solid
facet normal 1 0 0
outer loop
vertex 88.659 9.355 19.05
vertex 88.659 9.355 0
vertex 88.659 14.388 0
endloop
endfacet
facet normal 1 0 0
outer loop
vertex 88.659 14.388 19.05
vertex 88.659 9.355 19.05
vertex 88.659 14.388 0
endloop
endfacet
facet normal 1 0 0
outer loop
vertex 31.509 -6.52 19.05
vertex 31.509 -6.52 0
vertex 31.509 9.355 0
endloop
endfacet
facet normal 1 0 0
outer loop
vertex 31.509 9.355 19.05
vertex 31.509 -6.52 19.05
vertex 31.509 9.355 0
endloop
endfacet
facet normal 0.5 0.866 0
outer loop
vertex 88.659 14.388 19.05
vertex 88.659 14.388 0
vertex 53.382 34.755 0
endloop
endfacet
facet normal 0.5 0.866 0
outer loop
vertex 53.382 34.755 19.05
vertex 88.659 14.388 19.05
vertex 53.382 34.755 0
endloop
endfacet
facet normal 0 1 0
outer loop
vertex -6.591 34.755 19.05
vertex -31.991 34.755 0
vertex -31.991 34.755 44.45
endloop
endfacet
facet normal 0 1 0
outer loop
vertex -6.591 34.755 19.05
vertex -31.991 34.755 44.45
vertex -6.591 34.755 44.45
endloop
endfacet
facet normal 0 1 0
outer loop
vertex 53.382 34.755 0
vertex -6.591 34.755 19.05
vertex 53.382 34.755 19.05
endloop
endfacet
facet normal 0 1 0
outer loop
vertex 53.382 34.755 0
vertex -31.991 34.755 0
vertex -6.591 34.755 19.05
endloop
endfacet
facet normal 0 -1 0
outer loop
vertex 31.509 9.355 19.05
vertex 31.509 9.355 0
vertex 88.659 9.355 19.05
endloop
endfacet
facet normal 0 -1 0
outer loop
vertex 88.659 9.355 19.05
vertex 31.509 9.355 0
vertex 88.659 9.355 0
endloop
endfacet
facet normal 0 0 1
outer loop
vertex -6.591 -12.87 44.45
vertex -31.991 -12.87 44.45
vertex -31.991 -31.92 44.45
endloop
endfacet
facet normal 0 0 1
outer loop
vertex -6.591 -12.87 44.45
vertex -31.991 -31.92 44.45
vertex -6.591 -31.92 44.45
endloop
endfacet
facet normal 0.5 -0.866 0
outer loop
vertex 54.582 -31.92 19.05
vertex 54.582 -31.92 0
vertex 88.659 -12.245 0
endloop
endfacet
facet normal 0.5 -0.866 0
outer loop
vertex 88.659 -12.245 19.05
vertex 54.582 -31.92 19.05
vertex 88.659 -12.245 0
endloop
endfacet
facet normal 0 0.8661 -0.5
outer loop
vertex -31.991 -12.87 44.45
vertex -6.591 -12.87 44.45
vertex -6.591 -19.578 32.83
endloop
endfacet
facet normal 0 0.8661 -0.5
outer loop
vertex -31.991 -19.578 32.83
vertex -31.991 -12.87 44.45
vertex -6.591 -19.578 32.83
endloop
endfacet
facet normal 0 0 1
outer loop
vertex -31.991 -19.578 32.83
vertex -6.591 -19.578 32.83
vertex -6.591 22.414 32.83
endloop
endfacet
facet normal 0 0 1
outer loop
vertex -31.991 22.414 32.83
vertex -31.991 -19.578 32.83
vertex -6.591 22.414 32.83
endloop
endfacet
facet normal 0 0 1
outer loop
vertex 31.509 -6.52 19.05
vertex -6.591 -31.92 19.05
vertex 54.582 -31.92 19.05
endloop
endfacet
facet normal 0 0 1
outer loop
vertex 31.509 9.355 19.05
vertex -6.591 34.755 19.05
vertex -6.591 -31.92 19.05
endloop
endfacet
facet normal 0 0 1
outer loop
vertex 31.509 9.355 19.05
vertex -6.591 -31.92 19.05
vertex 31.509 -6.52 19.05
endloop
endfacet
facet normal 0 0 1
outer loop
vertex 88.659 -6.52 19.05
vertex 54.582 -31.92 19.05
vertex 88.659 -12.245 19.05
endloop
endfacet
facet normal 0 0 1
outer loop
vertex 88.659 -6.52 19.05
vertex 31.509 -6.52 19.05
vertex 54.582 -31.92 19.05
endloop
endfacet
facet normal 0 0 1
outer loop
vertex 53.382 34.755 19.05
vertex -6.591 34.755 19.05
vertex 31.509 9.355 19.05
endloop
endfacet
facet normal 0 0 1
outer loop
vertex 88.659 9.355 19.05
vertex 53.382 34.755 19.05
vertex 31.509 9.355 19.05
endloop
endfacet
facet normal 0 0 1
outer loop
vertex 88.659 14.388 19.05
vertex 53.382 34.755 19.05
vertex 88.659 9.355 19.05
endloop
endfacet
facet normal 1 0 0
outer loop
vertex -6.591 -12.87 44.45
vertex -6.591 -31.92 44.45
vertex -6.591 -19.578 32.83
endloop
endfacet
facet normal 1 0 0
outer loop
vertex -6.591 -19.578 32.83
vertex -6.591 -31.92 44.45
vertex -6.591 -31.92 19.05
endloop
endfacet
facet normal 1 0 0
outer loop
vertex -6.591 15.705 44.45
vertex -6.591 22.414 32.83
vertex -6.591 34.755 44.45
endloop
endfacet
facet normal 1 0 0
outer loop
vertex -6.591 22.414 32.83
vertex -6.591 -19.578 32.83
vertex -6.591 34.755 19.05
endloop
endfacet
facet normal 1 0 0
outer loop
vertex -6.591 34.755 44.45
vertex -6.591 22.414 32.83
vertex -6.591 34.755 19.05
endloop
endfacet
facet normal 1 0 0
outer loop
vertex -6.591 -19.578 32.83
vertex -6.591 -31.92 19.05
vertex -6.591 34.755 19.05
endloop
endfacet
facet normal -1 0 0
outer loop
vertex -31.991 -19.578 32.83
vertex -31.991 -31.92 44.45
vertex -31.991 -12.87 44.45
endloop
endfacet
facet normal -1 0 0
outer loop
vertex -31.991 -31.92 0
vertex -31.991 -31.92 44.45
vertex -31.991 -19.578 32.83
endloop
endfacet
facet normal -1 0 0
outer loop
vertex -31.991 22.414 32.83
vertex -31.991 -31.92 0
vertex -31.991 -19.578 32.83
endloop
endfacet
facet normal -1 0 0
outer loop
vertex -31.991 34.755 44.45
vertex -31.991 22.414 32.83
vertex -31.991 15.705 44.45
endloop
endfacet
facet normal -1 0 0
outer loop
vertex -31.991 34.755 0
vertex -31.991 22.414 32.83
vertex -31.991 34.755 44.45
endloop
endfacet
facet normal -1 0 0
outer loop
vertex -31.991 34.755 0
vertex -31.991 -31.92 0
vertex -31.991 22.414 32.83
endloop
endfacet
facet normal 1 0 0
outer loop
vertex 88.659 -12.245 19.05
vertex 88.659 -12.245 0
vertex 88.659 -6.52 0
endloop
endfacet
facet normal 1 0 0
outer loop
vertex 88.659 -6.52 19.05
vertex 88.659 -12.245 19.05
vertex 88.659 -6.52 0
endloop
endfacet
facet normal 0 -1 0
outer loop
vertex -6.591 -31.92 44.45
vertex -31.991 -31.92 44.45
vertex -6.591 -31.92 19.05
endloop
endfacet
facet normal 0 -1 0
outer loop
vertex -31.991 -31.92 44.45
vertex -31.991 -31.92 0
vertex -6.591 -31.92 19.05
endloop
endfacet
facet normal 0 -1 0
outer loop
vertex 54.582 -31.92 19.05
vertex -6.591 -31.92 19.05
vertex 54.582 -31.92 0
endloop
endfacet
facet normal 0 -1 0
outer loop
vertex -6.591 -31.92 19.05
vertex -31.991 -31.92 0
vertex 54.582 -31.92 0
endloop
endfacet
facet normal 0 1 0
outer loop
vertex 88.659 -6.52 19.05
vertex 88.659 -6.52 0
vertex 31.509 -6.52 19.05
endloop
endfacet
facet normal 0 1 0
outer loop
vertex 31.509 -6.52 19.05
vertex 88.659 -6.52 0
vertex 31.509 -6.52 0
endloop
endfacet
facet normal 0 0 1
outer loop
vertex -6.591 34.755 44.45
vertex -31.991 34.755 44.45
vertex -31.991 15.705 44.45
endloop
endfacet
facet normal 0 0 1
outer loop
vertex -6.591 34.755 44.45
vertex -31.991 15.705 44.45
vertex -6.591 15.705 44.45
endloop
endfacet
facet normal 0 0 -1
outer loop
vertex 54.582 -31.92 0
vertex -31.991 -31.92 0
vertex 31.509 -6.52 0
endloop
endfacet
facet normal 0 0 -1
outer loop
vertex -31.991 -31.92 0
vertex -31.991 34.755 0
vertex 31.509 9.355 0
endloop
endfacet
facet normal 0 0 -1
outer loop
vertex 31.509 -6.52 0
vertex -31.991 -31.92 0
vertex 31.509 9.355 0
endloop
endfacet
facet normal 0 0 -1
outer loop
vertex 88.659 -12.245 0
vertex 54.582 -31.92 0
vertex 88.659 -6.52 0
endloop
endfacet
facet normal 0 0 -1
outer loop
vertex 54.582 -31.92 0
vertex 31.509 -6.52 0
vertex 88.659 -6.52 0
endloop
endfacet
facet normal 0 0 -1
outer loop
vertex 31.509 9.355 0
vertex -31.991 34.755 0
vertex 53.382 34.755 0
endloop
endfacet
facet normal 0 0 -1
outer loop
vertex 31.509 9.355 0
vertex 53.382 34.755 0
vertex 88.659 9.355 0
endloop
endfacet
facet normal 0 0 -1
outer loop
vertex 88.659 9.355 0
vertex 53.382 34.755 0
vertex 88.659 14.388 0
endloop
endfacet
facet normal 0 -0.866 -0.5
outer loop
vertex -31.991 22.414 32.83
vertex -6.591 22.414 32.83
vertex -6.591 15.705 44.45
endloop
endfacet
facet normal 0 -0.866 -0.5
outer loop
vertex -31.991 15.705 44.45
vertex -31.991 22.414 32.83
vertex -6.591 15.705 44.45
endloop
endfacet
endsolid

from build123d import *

# Parameters (mm, degrees)
F1_DEPTH = 19.05
F2_W     = 25.4
F2_H     = 66.675
F3_DEPTH = 25.4
F5_DEPTH = 32.258


with BuildPart() as f1:
    # F0 (on Top) → F1 (new body)
    with BuildSketch(Plane.XY):
        Polygon((53.38208, 34.755277), (-31.990739, 34.755277), (-31.990739, -31.919723), (54.581683, -31.919723), (88.659261, -12.245024), (88.659261, -6.519723), (31.509261, -6.519723), (31.509261, 9.355277), (88.659261, 9.355277), (88.659261, 14.387987), align=None)
    extrude(amount=F1_DEPTH)

    # F2 (on face) → F3 (join)
    with BuildSketch(Plane.XY.offset(19.05)):
        with Locations((-19.290739, 1.417777)):
            Rectangle(F2_W, F2_H)
    extrude(amount=F3_DEPTH)

    # F4 (on face) → F5 (cut)
    with BuildSketch(Plane.YZ.offset(-6.590739)):
        Polygon((15.705277, 44.45), (-12.869723, 44.45), (-19.578354, 32.83031), (22.413908, 32.83031), align=None)
    extrude(amount=-F5_DEPTH, mode=Mode.SUBTRACT)


solid = f1.part
